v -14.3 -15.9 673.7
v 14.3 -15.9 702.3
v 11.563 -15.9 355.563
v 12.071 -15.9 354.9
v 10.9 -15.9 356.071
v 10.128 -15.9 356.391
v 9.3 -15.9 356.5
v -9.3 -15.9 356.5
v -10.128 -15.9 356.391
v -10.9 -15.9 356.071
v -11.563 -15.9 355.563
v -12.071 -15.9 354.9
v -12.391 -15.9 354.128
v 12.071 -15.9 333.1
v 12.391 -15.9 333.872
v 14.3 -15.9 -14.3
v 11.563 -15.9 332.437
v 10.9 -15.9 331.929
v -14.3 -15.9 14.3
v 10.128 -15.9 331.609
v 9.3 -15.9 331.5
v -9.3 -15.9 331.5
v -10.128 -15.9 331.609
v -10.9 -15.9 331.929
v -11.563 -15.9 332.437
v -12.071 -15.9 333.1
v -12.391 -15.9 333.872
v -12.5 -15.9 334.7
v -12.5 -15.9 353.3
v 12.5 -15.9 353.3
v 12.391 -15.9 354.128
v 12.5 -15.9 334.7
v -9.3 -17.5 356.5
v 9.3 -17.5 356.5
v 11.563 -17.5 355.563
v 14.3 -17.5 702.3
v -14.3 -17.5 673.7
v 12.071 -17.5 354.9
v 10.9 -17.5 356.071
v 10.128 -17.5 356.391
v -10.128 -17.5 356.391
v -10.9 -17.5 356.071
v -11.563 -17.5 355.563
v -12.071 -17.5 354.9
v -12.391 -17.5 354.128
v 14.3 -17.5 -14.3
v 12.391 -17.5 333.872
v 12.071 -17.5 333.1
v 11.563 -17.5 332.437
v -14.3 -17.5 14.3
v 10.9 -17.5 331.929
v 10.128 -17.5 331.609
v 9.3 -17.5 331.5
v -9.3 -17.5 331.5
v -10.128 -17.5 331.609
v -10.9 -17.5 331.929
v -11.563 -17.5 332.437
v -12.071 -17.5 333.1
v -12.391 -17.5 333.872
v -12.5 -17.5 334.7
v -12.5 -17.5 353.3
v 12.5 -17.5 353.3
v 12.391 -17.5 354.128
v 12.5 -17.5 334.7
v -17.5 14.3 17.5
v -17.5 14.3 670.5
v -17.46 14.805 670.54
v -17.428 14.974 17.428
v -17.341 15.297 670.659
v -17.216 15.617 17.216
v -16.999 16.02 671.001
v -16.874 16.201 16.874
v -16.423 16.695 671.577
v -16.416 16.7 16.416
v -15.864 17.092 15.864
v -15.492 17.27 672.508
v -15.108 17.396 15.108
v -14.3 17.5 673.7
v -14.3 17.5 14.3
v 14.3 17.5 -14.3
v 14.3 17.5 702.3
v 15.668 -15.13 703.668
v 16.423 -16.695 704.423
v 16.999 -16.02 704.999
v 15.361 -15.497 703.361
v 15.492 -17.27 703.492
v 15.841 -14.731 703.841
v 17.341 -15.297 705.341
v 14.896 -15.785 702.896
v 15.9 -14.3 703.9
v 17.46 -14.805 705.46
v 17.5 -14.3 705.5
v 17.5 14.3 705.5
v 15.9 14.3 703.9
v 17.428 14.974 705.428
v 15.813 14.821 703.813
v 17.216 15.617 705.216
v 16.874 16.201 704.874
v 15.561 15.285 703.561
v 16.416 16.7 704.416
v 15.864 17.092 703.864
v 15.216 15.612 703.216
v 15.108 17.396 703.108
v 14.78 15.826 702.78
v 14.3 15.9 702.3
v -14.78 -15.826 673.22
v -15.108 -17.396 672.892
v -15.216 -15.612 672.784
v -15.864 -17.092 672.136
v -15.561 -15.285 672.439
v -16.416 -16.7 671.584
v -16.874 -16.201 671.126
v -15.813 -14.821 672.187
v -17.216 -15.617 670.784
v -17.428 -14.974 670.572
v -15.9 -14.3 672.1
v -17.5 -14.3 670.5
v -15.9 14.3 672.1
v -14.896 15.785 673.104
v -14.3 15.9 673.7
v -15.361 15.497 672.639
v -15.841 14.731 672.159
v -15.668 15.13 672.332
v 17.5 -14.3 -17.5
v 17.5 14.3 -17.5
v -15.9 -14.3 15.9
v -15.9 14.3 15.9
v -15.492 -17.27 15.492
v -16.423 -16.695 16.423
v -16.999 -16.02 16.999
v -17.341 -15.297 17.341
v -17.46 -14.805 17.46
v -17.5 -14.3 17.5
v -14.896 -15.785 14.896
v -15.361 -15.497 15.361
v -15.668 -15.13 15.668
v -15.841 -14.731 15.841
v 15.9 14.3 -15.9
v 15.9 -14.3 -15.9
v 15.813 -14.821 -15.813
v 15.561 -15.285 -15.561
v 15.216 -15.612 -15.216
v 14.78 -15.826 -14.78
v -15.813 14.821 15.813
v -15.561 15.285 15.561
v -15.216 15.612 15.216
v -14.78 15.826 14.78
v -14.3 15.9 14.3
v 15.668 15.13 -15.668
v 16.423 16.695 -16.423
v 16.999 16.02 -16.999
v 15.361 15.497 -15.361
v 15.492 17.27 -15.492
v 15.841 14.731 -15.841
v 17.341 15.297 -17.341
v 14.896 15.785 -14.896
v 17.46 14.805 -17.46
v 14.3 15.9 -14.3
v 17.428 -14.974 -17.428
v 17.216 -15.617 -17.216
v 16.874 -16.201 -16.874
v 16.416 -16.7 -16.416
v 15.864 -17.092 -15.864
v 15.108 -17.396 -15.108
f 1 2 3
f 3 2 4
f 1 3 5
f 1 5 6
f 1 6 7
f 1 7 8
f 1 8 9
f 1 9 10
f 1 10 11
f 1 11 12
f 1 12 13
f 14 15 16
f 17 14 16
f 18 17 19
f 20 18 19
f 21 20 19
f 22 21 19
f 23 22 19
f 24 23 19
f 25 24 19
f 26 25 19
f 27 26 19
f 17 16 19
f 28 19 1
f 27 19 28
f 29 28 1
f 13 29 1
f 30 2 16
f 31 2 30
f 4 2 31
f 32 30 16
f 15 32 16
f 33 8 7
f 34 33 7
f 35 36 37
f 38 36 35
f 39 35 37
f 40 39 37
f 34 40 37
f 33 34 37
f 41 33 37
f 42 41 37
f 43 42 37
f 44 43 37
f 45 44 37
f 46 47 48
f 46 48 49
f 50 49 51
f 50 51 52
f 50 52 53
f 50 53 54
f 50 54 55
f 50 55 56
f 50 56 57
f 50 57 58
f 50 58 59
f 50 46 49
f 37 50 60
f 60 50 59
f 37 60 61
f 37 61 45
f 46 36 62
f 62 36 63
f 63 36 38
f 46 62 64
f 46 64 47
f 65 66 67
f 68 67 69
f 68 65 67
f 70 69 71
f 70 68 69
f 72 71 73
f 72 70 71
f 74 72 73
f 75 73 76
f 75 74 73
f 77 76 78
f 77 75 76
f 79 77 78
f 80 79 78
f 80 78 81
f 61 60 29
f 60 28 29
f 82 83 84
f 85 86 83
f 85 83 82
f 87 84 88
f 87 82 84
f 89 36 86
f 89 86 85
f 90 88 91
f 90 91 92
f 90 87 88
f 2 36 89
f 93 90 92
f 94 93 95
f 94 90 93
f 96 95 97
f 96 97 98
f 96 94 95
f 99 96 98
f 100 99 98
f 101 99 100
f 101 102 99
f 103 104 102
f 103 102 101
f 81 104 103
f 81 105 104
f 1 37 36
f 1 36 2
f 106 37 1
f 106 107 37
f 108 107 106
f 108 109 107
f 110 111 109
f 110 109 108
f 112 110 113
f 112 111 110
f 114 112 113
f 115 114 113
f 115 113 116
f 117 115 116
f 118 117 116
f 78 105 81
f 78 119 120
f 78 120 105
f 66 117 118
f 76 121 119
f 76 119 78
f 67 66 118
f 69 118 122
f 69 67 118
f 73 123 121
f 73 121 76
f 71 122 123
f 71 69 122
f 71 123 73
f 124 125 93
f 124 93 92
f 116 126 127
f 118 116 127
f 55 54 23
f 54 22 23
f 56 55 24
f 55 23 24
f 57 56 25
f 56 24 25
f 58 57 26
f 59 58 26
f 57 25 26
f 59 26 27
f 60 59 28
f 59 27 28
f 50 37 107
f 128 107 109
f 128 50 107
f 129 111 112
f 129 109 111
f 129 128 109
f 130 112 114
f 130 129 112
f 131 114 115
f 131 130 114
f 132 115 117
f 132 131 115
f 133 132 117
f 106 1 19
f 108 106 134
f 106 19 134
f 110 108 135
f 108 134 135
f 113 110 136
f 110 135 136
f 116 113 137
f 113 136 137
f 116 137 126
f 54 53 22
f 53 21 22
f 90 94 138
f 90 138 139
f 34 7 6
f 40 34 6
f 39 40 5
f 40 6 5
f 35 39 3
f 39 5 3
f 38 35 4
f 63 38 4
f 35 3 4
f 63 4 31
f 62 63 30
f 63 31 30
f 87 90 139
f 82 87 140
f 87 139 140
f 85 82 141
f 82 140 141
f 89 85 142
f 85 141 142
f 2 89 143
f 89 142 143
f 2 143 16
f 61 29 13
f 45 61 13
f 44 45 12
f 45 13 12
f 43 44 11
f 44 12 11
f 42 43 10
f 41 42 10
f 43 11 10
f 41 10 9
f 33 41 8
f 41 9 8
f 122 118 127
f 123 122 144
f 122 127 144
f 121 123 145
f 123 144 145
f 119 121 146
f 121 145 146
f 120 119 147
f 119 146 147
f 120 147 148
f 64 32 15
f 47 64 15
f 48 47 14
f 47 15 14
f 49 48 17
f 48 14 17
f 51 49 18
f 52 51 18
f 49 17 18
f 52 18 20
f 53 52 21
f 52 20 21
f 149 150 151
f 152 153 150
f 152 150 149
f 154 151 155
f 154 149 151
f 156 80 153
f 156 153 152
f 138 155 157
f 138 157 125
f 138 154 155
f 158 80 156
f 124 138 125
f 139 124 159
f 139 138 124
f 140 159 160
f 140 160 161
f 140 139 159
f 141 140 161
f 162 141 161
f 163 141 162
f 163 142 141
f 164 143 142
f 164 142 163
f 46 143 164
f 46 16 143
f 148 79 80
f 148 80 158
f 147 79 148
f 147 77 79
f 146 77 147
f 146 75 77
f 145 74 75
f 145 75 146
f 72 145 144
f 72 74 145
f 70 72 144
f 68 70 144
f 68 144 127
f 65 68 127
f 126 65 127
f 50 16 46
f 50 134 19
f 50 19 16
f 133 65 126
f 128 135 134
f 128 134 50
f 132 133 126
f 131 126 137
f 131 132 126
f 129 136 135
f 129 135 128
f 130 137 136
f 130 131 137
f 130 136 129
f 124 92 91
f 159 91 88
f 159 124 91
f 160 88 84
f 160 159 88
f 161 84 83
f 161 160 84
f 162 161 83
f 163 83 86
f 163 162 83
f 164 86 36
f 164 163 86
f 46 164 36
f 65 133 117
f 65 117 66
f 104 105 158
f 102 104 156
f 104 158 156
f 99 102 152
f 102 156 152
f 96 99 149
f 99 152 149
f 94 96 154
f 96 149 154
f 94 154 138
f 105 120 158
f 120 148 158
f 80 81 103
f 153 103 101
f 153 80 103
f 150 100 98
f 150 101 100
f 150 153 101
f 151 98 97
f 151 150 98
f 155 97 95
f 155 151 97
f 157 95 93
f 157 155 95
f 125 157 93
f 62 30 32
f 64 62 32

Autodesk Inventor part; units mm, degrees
ref_plane "Start plane" through (0, 0, -17.5) normal (0, 0, 1) x (1, 0, 0)
ref_plane "End plane" through (0, 0, 705.5) normal (0, 0, 1) x (1, 0, 0)
sketch "Sketch" plane through (0, 0, 0) normal (0, 0, 1) x (1, 0, 0)
  line L0 (-17.5, -14.3) -> (-17.5, 14.3)
  line L1 (-14.3, 17.5) -> (14.3, 17.5)
  line L2 (17.5, 14.3) -> (17.5, -14.3)
  line L3 (14.3, -17.5) -> (-14.3, -17.5)
  arc A0 (-17.5, -14.3) -> (-14.3, -17.5) centre (-14.3, -14.3) ccw
  arc A1 (-14.3, 17.5) -> (-17.5, 14.3) centre (-14.3, 14.3) ccw
  arc A2 (17.5, 14.3) -> (14.3, 17.5) centre (14.3, 14.3) ccw
  arc A3 (14.3, -17.5) -> (17.5, -14.3) centre (14.3, -14.3) ccw
  arc A4 (-14.3, 15.9) -> (-15.9, 14.3) centre (-14.3, 14.3) ccw
  line L4 (-14.3, 15.9) -> (14.3, 15.9)
  arc A5 (15.9, 14.3) -> (14.3, 15.9) centre (14.3, 14.3) ccw
  line L5 (15.9, 14.3) -> (15.9, -14.3)
  arc A6 (14.3, -15.9) -> (15.9, -14.3) centre (14.3, -14.3) ccw
  line L6 (14.3, -15.9) -> (-14.3, -15.9)
  arc A7 (-15.9, -14.3) -> (-14.3, -15.9) centre (-14.3, -14.3) ccw
  line L7 (-15.9, -14.3) -> (-15.9, 14.3)
  line L8 (0, 25.4278) -> (0, -25.4278) construction
  line L9 (-25.4278, 0) -> (25.4278, 0) construction
  dimension "d7" = 3.2
  dimension "d10" = 35
  dimension "d11" = 35
  dimension "d12" = 1.6
  dimension "d15" = 17.5
  dimension "d16" = 17.5
extrude "Body" add sketch "Sketch" along normal up to surface (723 mm away) from surface at -17.5
sketch "Sketch3" plane through (0, 0, 0) normal (0, 0, 1) x (1, 0, 0)
  line L0 (0, 0) -> (10, 0)
ref_plane "Work Plane3" through (0, 0, 0) normal (0, -1, 0) x (1, 0, 0)
sketch "Sketch4" plane through (0, 0, 0) normal (0, -1, 0) x (1, 0, 0)
  line L0 (-2, -17.5) -> (12, -17.5)
  line L1 (-2, 705.5) -> (12, 705.5)
  dimension "d18" = 723
ref_plane "Work Plane4" through (0, 0, 344) normal (0, -1, 0) x (1, 0, 0)
ref_plane "Work Plane5" through (0, -150, 344) normal (0, -1, 0) x (1, 0, 0)
ref_plane "Work Plane6" through (0, -75, 344) normal (0, -1, 0) x (1, 0, 0)
sketch "Sketch5" plane through (0, -75, 344) normal (0, -1, 0) x (1, 0, 0)
  arc A0 (-12.5, -9.3) -> (-9.3, -12.5) centre (-9.3, -9.3) ccw
  line L0 (-12.5, -9.3) -> (-12.5, 9.3)
  arc A1 (-9.3, 12.5) -> (-12.5, 9.3) centre (-9.3, 9.3) ccw
  line L1 (-9.3, 12.5) -> (9.3, 12.5)
  arc A2 (12.5, 9.3) -> (9.3, 12.5) centre (9.3, 9.3) ccw
  line L2 (12.5, 9.3) -> (12.5, -9.3)
  arc A3 (9.3, -12.5) -> (12.5, -9.3) centre (9.3, -9.3) ccw
  line L3 (9.3, -12.5) -> (-9.3, -12.5)
  arc A4 (-9.3, 10.9) -> (-10.9, 9.3) centre (-9.3, 9.3) ccw
  line L4 (-9.3, 10.9) -> (9.3, 10.9)
  arc A5 (10.9, 9.3) -> (9.3, 10.9) centre (9.3, 9.3) ccw
  line L5 (10.9, 9.3) -> (10.9, -9.3)
  arc A6 (9.3, -10.9) -> (10.9, -9.3) centre (9.3, -9.3) ccw
  line L6 (9.3, -10.9) -> (-9.3, -10.9)
  arc A7 (-10.9, -9.3) -> (-9.3, -10.9) centre (-9.3, -9.3) ccw
  line L7 (-10.9, -9.3) -> (-10.9, 9.3)
extrude "Extrusion2" cut sketch "Sketch5" along normal up to surface (150 mm away) from surface at -75 contours L0 A1 L1 A2 L2 A3 L3 A0 | L4 A5 L5 A6 L6 A7 L7 A4
ref_plane "Work Plane7" through (-17.5202, 0, 692.5586) normal (-0.871, 0, 0.4912) x (0.4912, 0, 0.871)
split "Split1" plane through (-17.5202, 0, 692.5586) removes the side toward (-0.871, 0, 0.4912)
ref_plane "Work Plane8" through (-17.5202, 0, -4.5586) normal (-0.871, 0, -0.4912) x (-0.4912, 0, 0.871)
split "Split2" plane through (-17.5202, 0, -4.5586) removes the side toward (-0.871, 0, -0.4912)
ref_plane "Work Plane9" through (17.5, 0, -17.5) normal (-0.7071, 0, -0.7071) x (-0.7071, 0, 0.7071)
split "Split3" plane through (17.5, 0, -17.5) removes the side toward (-0.7071, 0, -0.7071)
ref_plane "Work Plane10" through (17.5, 0, 705.5) normal (-0.7071, 0, 0.7071) x (0.7071, 0, 0.7071)
split "Split4" plane through (17.5, 0, 705.5) removes the side toward (-0.7071, 0, 0.7071)
equation "\"d7\" = G_IR"
equation "\"d10\" = G_H"
equation "\"d11\" = G_W"
equation "\"d12\" = G_T"
equation "\"d15\" = 0.5 * d10"
equation "\"d16\" = 0.5 * d11"
equation "\"d3\" = G_L"
equation "\"G_W\" = 35"
equation "\"G_H\" = 35"
equation "\"G_T\" = 1.6"
equation "\"G_IR\" = 3.2"
equation "\"G_L\" = d18"
equation "\"G_OFFSET_START\" = 17.5"
equation "\"G_OFFSET_END\" = 17.5"
equation "\"d13\" = -G_OFFSET_START"
equation "\"d14\" = G_OFFSET_END + B_L"
equation "\"B_L\" = 688"
properties part number "AS 1163 - C350L0 35x35x1.6 SHS - 723" material "Steel, Mild"
